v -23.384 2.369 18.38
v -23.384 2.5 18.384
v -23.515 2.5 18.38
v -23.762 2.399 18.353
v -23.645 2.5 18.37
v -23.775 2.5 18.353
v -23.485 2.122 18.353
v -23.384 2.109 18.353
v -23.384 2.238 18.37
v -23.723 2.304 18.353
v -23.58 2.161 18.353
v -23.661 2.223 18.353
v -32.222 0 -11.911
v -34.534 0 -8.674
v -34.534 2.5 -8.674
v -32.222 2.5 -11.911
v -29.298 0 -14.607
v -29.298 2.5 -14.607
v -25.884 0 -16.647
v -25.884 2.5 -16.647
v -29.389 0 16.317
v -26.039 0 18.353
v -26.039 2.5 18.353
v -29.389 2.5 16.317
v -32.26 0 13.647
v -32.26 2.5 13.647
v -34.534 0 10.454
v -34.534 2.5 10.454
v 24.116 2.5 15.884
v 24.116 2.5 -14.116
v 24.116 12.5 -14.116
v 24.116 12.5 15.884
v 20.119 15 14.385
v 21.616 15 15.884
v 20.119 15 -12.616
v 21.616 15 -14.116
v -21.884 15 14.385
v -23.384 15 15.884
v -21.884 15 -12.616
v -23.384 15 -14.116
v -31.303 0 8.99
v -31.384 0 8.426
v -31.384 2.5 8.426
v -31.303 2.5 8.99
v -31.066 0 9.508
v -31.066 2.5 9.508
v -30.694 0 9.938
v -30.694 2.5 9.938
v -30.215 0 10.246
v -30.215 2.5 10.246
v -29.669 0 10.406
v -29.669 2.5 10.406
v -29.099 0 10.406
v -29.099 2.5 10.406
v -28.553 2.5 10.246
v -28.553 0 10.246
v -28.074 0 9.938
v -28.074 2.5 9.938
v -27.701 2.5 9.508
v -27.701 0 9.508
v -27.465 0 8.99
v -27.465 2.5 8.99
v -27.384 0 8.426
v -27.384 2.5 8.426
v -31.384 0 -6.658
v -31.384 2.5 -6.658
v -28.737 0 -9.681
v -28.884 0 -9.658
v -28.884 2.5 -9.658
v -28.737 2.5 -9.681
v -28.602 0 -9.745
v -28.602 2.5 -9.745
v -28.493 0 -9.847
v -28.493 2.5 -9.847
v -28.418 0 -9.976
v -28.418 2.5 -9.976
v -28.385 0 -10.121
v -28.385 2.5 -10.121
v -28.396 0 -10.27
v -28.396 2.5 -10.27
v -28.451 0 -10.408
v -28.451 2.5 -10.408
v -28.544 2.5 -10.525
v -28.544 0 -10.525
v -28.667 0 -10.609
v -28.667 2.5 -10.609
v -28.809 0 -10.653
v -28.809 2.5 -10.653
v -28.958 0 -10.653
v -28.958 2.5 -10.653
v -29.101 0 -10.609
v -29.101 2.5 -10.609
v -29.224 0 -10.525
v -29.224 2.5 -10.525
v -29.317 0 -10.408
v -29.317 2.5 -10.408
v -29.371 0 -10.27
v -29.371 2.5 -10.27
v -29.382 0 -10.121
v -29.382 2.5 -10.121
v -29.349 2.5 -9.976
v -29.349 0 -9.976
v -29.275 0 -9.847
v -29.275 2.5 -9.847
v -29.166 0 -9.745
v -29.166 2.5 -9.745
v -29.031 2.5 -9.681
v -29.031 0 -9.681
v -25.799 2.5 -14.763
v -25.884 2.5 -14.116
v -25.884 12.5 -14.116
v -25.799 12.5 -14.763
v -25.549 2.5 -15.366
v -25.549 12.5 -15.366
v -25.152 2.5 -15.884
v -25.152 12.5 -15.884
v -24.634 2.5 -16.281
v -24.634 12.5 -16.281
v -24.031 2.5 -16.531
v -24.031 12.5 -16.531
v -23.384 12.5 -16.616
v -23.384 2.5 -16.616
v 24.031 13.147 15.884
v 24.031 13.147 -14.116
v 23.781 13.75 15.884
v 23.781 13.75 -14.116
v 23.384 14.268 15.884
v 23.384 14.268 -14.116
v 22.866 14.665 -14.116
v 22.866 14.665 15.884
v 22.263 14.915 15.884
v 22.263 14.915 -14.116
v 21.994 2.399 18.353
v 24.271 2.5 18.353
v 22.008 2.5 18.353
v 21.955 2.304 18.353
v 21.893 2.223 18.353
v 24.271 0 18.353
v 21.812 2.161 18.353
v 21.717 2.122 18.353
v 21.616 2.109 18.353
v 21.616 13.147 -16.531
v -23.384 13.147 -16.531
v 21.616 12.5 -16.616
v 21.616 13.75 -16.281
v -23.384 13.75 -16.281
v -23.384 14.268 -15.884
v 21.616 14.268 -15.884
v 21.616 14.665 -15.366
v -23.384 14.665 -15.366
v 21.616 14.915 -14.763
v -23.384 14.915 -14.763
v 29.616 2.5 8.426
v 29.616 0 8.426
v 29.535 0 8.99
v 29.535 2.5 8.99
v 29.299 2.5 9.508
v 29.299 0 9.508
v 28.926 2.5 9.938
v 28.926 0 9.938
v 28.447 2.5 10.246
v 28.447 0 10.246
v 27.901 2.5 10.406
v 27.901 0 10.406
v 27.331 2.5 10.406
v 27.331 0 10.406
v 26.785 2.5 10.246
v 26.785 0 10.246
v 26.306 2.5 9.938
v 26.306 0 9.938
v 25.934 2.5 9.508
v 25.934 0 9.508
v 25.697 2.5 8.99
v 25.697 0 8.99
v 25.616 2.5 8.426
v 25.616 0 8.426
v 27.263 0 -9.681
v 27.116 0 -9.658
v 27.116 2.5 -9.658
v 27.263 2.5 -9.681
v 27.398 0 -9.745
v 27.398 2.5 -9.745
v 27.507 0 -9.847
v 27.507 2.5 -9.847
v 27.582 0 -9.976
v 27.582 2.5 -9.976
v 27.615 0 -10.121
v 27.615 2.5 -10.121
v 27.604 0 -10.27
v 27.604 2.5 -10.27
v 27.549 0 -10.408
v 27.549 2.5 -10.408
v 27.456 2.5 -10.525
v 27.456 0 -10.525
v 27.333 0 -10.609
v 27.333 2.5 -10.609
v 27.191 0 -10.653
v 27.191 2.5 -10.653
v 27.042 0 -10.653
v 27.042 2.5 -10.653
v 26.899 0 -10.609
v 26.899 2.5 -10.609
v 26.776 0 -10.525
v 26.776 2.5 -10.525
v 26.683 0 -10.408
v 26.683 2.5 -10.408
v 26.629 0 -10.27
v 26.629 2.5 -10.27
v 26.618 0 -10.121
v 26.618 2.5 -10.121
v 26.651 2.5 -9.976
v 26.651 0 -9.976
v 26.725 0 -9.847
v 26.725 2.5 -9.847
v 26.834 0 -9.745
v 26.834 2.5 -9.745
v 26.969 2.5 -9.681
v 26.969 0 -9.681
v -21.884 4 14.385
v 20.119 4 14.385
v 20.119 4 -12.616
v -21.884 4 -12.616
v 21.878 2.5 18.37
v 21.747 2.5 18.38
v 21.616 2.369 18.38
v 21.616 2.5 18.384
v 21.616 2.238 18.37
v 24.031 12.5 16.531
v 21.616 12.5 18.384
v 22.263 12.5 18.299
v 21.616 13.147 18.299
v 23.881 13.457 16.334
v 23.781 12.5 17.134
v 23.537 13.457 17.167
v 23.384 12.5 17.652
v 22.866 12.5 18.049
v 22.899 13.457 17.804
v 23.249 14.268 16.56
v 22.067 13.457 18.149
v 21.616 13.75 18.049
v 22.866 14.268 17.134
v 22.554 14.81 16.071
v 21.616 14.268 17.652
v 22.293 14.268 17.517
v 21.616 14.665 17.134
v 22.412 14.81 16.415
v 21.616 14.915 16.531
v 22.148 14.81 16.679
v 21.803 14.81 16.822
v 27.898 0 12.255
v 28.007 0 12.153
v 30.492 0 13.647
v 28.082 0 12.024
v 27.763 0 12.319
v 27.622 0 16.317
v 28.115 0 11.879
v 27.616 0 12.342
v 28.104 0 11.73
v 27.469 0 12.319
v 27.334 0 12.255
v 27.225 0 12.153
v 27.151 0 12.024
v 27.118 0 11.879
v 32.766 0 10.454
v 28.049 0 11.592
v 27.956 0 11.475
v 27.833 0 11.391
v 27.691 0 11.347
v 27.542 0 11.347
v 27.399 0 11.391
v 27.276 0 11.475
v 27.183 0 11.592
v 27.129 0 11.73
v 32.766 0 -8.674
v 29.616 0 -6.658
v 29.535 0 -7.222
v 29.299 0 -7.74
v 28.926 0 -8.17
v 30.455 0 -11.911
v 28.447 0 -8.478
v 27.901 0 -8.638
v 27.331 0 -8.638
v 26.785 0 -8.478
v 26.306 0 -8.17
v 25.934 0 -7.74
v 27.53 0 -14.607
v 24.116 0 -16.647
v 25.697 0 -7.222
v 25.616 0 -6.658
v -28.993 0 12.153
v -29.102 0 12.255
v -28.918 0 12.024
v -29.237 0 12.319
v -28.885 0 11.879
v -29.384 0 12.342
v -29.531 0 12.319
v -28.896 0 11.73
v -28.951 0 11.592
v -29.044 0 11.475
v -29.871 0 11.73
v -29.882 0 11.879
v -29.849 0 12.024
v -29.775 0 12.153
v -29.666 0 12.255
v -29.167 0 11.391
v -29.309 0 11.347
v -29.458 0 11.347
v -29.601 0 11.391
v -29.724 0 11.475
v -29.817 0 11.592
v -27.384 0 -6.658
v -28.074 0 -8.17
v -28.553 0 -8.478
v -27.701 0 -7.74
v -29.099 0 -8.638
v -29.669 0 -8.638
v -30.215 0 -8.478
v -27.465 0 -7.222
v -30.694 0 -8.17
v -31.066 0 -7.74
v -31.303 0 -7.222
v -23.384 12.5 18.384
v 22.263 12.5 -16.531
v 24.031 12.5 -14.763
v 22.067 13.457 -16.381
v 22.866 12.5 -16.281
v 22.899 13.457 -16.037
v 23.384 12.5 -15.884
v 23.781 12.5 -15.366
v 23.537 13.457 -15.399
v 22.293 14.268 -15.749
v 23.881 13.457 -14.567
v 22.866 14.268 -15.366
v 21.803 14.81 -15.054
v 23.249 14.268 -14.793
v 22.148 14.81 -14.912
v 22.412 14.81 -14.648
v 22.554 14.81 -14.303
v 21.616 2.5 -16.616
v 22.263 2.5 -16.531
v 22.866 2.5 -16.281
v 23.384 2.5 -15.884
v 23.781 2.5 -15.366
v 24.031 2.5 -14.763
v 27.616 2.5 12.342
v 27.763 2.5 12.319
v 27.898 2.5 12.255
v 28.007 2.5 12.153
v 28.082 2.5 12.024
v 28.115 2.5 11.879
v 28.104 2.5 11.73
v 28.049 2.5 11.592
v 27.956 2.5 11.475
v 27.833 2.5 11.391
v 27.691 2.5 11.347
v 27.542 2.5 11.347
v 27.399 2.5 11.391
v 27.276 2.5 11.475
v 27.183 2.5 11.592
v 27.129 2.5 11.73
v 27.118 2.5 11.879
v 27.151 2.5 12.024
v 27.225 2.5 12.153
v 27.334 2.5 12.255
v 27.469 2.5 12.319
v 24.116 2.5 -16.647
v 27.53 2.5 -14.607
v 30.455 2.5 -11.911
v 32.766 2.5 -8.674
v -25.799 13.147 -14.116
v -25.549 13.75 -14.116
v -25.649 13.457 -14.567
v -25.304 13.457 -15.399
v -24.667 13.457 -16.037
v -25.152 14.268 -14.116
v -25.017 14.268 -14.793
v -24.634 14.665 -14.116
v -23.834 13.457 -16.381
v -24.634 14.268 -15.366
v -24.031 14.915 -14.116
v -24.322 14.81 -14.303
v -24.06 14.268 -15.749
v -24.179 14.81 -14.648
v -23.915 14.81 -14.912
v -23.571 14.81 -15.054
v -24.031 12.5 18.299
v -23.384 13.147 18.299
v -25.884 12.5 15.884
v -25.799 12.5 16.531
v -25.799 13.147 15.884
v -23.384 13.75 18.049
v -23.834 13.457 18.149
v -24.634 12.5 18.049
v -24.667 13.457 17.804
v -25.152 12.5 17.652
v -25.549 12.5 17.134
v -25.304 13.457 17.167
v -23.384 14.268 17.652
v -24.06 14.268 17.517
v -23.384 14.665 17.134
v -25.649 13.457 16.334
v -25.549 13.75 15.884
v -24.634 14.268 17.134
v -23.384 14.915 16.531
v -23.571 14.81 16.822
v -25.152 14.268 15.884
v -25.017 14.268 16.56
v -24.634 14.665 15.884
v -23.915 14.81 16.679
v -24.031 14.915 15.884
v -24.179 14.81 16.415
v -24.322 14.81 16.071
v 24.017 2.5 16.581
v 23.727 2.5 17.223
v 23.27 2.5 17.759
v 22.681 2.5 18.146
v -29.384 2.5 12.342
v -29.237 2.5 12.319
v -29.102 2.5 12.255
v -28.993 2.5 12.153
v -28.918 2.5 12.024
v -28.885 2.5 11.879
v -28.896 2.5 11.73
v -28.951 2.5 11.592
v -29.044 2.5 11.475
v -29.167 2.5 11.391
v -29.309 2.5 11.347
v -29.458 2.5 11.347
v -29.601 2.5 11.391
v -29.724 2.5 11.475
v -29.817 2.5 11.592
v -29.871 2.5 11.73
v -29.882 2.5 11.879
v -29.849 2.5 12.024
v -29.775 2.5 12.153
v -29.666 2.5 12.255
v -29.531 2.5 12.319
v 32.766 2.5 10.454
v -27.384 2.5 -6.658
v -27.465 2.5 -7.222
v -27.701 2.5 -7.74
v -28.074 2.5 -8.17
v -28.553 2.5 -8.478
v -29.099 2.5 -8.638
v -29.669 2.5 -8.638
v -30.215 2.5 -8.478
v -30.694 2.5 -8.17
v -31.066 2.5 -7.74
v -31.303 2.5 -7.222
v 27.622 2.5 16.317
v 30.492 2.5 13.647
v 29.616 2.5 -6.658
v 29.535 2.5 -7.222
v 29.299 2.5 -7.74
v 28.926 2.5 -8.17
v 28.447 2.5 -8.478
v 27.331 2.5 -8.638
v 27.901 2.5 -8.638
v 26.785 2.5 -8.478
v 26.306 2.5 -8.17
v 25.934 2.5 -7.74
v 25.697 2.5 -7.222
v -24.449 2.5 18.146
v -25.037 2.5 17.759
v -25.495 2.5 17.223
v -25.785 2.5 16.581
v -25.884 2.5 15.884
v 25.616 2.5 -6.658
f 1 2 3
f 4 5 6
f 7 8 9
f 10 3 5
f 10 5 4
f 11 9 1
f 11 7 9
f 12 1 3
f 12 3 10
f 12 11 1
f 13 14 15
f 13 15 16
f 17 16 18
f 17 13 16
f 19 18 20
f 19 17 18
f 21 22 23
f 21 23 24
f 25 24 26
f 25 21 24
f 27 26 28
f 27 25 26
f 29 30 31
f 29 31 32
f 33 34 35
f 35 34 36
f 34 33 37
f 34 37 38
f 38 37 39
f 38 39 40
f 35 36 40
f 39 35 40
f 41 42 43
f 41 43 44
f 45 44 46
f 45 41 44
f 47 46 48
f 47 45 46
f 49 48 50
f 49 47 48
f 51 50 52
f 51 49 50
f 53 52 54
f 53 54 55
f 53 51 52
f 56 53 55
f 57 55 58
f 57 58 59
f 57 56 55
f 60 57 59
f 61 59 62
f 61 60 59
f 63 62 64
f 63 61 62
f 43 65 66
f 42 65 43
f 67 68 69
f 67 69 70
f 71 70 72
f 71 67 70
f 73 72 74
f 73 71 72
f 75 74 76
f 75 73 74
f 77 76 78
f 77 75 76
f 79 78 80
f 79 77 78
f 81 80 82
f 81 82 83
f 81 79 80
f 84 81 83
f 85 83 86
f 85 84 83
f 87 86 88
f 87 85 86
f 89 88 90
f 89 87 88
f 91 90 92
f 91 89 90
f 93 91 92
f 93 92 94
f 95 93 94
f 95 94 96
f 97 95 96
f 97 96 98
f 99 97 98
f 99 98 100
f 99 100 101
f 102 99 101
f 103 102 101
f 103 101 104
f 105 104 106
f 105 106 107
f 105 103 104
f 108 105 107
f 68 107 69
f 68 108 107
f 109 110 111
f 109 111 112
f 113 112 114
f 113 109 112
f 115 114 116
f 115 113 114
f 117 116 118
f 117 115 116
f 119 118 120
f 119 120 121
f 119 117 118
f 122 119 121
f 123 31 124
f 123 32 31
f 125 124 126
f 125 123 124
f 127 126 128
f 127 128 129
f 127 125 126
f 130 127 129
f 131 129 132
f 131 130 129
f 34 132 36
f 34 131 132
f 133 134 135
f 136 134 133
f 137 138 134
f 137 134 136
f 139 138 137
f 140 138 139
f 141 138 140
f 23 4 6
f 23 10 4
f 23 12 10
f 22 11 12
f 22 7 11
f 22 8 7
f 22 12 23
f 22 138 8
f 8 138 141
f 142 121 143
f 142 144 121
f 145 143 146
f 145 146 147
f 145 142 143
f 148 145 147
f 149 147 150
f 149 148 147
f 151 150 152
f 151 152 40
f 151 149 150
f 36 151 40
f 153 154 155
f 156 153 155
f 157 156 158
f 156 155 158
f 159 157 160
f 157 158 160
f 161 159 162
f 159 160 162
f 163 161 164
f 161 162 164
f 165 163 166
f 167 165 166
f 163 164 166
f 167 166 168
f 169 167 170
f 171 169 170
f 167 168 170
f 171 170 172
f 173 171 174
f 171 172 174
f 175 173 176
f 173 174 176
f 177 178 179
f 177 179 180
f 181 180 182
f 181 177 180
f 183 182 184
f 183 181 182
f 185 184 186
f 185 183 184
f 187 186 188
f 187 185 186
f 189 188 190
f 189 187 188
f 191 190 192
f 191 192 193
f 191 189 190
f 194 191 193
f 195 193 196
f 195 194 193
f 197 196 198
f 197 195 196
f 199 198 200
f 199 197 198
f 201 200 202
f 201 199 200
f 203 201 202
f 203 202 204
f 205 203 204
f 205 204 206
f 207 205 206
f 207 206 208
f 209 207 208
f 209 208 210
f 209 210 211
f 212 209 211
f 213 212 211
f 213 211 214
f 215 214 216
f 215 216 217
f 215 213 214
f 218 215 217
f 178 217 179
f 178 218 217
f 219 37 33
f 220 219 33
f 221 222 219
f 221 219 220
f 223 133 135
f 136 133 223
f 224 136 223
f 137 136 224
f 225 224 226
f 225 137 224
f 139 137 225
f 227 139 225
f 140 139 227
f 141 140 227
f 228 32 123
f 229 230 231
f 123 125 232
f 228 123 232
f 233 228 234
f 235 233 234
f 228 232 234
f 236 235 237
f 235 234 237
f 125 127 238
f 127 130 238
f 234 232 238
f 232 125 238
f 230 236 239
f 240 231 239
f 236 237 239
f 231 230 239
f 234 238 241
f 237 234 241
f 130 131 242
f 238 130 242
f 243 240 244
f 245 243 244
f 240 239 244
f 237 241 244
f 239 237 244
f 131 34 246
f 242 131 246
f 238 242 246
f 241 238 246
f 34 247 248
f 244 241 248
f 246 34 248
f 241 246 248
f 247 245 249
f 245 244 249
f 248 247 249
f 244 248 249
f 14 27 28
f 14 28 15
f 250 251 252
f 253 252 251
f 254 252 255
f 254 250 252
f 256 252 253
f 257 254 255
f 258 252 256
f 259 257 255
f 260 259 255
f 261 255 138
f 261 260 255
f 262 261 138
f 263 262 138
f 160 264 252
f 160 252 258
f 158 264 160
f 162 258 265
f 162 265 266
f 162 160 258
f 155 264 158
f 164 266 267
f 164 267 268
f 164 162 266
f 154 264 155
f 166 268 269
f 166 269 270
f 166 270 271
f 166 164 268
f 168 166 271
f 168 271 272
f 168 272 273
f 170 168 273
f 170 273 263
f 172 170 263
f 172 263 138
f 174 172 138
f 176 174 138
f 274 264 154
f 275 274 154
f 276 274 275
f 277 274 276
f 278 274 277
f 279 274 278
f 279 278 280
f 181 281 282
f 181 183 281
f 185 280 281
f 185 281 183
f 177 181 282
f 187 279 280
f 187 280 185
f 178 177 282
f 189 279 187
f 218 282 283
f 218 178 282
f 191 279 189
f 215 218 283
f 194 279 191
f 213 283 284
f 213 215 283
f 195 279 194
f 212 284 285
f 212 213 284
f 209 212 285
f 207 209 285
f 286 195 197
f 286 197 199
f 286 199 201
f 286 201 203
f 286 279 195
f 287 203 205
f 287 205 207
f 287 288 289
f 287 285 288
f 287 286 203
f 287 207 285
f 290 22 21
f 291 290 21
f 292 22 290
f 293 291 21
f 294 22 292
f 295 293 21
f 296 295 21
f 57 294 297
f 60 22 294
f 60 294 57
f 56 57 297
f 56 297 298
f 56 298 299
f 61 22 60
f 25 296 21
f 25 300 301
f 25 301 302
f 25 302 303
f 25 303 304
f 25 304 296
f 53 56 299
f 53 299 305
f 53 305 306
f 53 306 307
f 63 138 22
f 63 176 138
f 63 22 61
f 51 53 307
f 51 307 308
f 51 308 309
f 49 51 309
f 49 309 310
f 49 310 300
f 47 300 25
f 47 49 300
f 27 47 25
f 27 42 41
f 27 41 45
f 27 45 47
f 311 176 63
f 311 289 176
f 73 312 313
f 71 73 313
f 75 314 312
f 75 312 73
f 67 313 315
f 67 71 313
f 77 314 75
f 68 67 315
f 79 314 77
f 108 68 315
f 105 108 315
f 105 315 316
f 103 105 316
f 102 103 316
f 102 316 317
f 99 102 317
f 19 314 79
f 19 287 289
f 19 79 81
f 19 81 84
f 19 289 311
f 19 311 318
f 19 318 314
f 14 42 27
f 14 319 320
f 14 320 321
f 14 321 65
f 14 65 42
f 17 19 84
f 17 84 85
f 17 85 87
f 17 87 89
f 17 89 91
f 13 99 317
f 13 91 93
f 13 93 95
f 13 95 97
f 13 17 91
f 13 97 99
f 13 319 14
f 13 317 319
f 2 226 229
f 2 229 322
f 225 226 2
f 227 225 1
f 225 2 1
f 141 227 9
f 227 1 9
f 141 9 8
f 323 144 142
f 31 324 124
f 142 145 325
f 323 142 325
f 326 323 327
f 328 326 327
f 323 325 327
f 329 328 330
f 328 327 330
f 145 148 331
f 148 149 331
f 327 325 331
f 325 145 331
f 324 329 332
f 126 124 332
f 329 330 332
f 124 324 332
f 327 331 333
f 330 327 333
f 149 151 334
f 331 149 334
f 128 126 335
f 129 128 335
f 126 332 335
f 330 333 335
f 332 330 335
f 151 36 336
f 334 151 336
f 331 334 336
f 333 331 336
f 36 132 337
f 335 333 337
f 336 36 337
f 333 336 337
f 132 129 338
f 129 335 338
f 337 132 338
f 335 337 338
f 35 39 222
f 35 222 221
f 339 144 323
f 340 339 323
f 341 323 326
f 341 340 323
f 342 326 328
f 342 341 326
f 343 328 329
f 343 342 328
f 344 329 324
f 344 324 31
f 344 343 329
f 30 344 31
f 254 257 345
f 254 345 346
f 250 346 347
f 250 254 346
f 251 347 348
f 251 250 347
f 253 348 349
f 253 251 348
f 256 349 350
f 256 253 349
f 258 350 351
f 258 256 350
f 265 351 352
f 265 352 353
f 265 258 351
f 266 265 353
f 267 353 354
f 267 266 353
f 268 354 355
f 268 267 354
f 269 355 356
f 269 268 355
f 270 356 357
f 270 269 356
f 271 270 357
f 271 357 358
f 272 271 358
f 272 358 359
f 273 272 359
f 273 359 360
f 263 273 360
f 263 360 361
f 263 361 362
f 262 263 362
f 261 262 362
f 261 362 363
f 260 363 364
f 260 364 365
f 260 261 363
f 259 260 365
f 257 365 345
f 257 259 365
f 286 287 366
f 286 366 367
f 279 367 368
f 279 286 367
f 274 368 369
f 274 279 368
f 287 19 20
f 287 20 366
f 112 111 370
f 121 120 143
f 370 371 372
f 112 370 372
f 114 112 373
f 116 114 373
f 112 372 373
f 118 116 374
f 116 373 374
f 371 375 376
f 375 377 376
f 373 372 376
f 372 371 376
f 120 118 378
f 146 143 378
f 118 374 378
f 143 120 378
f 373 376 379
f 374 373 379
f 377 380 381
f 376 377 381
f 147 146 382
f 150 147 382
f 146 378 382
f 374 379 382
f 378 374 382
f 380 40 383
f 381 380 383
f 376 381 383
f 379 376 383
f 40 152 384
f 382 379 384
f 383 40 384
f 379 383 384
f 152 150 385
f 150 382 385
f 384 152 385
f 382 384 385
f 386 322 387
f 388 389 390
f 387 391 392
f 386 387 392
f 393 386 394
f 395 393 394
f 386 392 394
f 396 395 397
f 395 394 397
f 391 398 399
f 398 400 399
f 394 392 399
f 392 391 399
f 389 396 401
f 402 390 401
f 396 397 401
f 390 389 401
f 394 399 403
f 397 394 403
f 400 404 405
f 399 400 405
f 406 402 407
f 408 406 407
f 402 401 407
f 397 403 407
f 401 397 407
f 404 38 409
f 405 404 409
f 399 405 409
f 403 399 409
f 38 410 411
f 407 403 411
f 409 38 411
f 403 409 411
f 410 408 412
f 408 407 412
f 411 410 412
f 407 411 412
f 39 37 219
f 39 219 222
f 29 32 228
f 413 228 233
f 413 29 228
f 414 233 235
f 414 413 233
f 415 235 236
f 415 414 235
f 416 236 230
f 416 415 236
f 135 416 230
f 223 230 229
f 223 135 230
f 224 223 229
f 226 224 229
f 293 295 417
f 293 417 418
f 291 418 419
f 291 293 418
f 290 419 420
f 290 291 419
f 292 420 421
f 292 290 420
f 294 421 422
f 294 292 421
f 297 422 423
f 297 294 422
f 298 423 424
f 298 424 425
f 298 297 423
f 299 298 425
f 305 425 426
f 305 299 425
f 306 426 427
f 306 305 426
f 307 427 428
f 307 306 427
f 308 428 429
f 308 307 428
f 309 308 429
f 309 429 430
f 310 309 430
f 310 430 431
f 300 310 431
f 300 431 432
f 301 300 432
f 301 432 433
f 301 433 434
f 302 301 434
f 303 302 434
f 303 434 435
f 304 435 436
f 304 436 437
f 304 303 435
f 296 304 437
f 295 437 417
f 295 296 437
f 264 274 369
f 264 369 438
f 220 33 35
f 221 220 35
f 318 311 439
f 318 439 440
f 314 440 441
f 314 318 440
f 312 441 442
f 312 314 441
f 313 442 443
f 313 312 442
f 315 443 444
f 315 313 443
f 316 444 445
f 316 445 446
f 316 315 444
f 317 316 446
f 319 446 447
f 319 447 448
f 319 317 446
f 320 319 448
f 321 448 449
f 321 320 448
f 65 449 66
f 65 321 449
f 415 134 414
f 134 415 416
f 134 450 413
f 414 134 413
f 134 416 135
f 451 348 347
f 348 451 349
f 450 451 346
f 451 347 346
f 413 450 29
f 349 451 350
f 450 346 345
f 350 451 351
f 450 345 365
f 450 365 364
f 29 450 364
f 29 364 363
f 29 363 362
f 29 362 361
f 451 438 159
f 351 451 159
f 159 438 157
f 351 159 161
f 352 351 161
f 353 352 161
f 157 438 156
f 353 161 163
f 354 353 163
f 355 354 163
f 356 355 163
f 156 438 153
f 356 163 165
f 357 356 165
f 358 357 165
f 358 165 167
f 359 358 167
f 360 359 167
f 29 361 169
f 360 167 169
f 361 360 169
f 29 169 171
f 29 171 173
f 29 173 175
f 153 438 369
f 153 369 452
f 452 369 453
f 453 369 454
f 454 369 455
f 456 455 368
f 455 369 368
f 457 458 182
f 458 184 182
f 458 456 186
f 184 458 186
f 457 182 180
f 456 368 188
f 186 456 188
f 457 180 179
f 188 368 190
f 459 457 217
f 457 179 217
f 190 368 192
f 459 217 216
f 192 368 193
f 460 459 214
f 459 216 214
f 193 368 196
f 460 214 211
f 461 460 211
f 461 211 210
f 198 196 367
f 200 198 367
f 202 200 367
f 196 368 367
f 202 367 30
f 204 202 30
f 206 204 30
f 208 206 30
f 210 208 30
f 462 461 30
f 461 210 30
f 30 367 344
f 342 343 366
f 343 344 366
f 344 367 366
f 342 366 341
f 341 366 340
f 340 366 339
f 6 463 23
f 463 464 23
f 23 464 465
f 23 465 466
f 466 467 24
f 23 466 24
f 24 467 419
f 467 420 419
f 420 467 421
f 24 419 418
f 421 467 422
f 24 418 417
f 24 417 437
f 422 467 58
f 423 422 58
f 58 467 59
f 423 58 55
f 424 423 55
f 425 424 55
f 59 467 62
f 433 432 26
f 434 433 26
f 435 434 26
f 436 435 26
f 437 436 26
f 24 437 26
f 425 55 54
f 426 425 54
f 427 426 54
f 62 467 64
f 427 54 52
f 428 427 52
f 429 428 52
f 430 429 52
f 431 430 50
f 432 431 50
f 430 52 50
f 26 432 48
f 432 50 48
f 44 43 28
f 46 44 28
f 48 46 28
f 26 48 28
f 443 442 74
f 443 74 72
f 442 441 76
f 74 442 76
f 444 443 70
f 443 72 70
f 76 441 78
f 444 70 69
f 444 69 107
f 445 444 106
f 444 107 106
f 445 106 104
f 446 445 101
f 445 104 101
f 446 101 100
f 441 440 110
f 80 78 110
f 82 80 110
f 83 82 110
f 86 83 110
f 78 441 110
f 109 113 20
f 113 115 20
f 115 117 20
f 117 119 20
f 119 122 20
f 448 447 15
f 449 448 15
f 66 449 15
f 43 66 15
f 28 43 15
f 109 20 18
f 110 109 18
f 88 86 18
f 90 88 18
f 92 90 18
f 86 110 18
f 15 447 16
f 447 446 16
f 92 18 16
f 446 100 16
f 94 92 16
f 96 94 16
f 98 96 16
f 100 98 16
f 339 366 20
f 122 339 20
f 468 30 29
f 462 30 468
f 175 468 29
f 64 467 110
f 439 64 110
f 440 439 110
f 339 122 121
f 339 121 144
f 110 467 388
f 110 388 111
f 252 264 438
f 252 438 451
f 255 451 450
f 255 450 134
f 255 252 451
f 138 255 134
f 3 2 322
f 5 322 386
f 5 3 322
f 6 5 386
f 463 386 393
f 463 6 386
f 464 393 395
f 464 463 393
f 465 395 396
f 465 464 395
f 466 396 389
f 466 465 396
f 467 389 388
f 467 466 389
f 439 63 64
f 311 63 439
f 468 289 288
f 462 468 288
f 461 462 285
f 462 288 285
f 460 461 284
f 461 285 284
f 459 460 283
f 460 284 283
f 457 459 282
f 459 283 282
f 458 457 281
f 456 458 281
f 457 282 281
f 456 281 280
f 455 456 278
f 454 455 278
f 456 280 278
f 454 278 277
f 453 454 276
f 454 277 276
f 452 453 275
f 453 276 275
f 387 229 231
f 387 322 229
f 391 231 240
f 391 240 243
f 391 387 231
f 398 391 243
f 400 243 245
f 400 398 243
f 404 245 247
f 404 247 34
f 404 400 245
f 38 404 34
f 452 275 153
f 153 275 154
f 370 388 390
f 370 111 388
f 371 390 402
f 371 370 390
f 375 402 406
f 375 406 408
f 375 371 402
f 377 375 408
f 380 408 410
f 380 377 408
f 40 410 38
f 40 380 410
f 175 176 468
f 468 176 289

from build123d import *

# Parameters (mm, degrees)
BOSS_EXTRUDE2_DEPTH = 15
FILLET2_R           = 2.5
SKETCH3_R           = 0.5
BOSS_EXTRUDE4_DEPTH = 2.5
SKETCH4_W           = 42.002754972
SKETCH4_H           = 27.001036704
CUT_EXTRUDE2_DEPTH  = 11


with BuildPart() as part:
    # Sketch1 → Boss-Extrude2 (new body)
    with BuildSketch(Plane(origin=(0, 0, 0), x_dir=(1, 0, 0), z_dir=(0, 1, 0))):
        with BuildLine():
            Line((-23.383883476, 16.616116524), (21.616116524, 16.616116524))
            ThreePointArc((21.616116524, 16.616116524), (23.383883476, 15.883883476), (24.116116524, 14.116116524))
            Line((24.116116524, 14.116116524), (24.116116524, -15.883883476))
            ThreePointArc((24.116116524, -15.883883476), (23.383883476, -17.651650429), (21.616116524, -18.383883476))
            Line((21.616116524, -18.383883476), (-23.383883476, -18.383883476))
            ThreePointArc((-23.383883476, -18.383883476), (-25.151650429, -17.651650429), (-25.883883476, -15.883883476))
            Line((-25.883883476, -15.883883476), (-25.883883476, 14.116116524))
            ThreePointArc((-25.883883476, 14.116116524), (-25.151650429, 15.883883476), (-23.383883476, 16.616116524))
        make_face()
    extrude(amount=BOSS_EXTRUDE2_DEPTH)

    # Fillet2
    fillet2_edges = [part.edges().sort_by_distance(p)[0] for p in [
        (-25.151650429, 15, 17.651650429),
        (-25.883883476, 0, 0.883883476),
        (-25.151650429, 0, -15.883883476),
        (-0.883883476, 15, 18.383883476),
        (23.383883476, 15, 17.651650429),
        (24.116116524, 15, 0.883883476),
        (23.383883476, 15, -15.883883476),
        (-0.883883476, 15, -16.616116524),
        (-25.151650429, 15, -15.883883476),
        (-25.883883476, 15, 0.883883476),
        (-0.883883476, 0, -16.616116524),
        (23.383883476, 0, -15.883883476),
        (24.116116524, 0, 0.883883476),
        (23.383883476, 0, 17.651650429),
        (-0.883883476, 0, 18.383883476),
        (-25.151650429, 0, 17.651650429),
    ]]
    fillet(fillet2_edges, radius=FILLET2_R)

    # Sketch3 → Boss-Extrude4 (add)
    with BuildSketch(Plane(origin=(0, 0, 0), x_dir=(1, 0, 0), z_dir=(0, 1, 0))):
        with BuildLine():
            Line((-25.883883476, 16.646945133), (24.116116524, 16.646945133))
            ThreePointArc((24.116116524, 16.646945133), (29.061870418, 13.334132498), (32.766116524, 8.674328862))
            Line((32.766116524, 8.674328862), (32.766116524, -10.453501419))
            ThreePointArc((32.766116524, -10.453501419), (29.124788001, -15.055056138), (24.271254893, -18.353054867))
            Line((24.271254893, -18.353054867), (-26.039021846, -18.353054867))
            ThreePointArc((-26.039021846, -18.353054867), (-30.892554954, -15.055056138), (-34.533883476, -10.453501419))
            Line((-34.533883476, -10.453501419), (-34.533883476, 8.674328862))
            ThreePointArc((-34.533883476, 8.674328862), (-30.829637371, 13.334132498), (-25.883883476, 16.646945133))
        make_face()
        with Locations(Location((-28.883883476, 10.158483361, 0), (0, 0, 270))):
            Circle(SKETCH3_R, mode=Mode.SUBTRACT)
        with Locations(Location((-29.383883476, -11.841516639, 0), (0, 0, 270))):
            Circle(SKETCH3_R, mode=Mode.SUBTRACT)
        with Locations(Location((27.616116524, -11.841516639, 0), (0, 0, 270))):
            Circle(SKETCH3_R, mode=Mode.SUBTRACT)
        with Locations(Location((27.116116524, 10.158483361, 0), (0, 0, 270))):
            Circle(SKETCH3_R, mode=Mode.SUBTRACT)
        with BuildLine():
            Line((29.616116524, 6.658483361), (29.616116524, -8.426250314))
            ThreePointArc((29.616116524, -8.426250314), (27.616116524, -10.426250314), (25.616116524, -8.426250314))
            Line((25.616116524, -8.426250314), (25.616116524, 6.658483361))
            ThreePointArc((25.616116524, 6.658483361), (27.616116524, 8.658483361), (29.616116524, 6.658483361))
        make_face(mode=Mode.SUBTRACT)
        with BuildLine():
            Line((-31.383883476, 6.658483361), (-31.383883476, -8.426250314))
            ThreePointArc((-31.383883476, -8.426250314), (-29.383883476, -10.426250314), (-27.383883476, -8.426250314))
            Line((-27.383883476, -8.426250314), (-27.383883476, 6.658483361))
            ThreePointArc((-27.383883476, 6.658483361), (-29.383883476, 8.658483361), (-31.383883476, 6.658483361))
        make_face(mode=Mode.SUBTRACT)
    extrude(amount=BOSS_EXTRUDE4_DEPTH)

    # Sketch4 → Cut-Extrude2 (cut)
    with BuildSketch(Plane(origin=(0, 15, 0), x_dir=(1, 0, 0), z_dir=(0, 1, 0))):
        with Locations((-0.88269634, -0.884055652)):
            Rectangle(SKETCH4_W, SKETCH4_H)
    extrude(amount=-CUT_EXTRUDE2_DEPTH, mode=Mode.SUBTRACT)


solid = part.part
